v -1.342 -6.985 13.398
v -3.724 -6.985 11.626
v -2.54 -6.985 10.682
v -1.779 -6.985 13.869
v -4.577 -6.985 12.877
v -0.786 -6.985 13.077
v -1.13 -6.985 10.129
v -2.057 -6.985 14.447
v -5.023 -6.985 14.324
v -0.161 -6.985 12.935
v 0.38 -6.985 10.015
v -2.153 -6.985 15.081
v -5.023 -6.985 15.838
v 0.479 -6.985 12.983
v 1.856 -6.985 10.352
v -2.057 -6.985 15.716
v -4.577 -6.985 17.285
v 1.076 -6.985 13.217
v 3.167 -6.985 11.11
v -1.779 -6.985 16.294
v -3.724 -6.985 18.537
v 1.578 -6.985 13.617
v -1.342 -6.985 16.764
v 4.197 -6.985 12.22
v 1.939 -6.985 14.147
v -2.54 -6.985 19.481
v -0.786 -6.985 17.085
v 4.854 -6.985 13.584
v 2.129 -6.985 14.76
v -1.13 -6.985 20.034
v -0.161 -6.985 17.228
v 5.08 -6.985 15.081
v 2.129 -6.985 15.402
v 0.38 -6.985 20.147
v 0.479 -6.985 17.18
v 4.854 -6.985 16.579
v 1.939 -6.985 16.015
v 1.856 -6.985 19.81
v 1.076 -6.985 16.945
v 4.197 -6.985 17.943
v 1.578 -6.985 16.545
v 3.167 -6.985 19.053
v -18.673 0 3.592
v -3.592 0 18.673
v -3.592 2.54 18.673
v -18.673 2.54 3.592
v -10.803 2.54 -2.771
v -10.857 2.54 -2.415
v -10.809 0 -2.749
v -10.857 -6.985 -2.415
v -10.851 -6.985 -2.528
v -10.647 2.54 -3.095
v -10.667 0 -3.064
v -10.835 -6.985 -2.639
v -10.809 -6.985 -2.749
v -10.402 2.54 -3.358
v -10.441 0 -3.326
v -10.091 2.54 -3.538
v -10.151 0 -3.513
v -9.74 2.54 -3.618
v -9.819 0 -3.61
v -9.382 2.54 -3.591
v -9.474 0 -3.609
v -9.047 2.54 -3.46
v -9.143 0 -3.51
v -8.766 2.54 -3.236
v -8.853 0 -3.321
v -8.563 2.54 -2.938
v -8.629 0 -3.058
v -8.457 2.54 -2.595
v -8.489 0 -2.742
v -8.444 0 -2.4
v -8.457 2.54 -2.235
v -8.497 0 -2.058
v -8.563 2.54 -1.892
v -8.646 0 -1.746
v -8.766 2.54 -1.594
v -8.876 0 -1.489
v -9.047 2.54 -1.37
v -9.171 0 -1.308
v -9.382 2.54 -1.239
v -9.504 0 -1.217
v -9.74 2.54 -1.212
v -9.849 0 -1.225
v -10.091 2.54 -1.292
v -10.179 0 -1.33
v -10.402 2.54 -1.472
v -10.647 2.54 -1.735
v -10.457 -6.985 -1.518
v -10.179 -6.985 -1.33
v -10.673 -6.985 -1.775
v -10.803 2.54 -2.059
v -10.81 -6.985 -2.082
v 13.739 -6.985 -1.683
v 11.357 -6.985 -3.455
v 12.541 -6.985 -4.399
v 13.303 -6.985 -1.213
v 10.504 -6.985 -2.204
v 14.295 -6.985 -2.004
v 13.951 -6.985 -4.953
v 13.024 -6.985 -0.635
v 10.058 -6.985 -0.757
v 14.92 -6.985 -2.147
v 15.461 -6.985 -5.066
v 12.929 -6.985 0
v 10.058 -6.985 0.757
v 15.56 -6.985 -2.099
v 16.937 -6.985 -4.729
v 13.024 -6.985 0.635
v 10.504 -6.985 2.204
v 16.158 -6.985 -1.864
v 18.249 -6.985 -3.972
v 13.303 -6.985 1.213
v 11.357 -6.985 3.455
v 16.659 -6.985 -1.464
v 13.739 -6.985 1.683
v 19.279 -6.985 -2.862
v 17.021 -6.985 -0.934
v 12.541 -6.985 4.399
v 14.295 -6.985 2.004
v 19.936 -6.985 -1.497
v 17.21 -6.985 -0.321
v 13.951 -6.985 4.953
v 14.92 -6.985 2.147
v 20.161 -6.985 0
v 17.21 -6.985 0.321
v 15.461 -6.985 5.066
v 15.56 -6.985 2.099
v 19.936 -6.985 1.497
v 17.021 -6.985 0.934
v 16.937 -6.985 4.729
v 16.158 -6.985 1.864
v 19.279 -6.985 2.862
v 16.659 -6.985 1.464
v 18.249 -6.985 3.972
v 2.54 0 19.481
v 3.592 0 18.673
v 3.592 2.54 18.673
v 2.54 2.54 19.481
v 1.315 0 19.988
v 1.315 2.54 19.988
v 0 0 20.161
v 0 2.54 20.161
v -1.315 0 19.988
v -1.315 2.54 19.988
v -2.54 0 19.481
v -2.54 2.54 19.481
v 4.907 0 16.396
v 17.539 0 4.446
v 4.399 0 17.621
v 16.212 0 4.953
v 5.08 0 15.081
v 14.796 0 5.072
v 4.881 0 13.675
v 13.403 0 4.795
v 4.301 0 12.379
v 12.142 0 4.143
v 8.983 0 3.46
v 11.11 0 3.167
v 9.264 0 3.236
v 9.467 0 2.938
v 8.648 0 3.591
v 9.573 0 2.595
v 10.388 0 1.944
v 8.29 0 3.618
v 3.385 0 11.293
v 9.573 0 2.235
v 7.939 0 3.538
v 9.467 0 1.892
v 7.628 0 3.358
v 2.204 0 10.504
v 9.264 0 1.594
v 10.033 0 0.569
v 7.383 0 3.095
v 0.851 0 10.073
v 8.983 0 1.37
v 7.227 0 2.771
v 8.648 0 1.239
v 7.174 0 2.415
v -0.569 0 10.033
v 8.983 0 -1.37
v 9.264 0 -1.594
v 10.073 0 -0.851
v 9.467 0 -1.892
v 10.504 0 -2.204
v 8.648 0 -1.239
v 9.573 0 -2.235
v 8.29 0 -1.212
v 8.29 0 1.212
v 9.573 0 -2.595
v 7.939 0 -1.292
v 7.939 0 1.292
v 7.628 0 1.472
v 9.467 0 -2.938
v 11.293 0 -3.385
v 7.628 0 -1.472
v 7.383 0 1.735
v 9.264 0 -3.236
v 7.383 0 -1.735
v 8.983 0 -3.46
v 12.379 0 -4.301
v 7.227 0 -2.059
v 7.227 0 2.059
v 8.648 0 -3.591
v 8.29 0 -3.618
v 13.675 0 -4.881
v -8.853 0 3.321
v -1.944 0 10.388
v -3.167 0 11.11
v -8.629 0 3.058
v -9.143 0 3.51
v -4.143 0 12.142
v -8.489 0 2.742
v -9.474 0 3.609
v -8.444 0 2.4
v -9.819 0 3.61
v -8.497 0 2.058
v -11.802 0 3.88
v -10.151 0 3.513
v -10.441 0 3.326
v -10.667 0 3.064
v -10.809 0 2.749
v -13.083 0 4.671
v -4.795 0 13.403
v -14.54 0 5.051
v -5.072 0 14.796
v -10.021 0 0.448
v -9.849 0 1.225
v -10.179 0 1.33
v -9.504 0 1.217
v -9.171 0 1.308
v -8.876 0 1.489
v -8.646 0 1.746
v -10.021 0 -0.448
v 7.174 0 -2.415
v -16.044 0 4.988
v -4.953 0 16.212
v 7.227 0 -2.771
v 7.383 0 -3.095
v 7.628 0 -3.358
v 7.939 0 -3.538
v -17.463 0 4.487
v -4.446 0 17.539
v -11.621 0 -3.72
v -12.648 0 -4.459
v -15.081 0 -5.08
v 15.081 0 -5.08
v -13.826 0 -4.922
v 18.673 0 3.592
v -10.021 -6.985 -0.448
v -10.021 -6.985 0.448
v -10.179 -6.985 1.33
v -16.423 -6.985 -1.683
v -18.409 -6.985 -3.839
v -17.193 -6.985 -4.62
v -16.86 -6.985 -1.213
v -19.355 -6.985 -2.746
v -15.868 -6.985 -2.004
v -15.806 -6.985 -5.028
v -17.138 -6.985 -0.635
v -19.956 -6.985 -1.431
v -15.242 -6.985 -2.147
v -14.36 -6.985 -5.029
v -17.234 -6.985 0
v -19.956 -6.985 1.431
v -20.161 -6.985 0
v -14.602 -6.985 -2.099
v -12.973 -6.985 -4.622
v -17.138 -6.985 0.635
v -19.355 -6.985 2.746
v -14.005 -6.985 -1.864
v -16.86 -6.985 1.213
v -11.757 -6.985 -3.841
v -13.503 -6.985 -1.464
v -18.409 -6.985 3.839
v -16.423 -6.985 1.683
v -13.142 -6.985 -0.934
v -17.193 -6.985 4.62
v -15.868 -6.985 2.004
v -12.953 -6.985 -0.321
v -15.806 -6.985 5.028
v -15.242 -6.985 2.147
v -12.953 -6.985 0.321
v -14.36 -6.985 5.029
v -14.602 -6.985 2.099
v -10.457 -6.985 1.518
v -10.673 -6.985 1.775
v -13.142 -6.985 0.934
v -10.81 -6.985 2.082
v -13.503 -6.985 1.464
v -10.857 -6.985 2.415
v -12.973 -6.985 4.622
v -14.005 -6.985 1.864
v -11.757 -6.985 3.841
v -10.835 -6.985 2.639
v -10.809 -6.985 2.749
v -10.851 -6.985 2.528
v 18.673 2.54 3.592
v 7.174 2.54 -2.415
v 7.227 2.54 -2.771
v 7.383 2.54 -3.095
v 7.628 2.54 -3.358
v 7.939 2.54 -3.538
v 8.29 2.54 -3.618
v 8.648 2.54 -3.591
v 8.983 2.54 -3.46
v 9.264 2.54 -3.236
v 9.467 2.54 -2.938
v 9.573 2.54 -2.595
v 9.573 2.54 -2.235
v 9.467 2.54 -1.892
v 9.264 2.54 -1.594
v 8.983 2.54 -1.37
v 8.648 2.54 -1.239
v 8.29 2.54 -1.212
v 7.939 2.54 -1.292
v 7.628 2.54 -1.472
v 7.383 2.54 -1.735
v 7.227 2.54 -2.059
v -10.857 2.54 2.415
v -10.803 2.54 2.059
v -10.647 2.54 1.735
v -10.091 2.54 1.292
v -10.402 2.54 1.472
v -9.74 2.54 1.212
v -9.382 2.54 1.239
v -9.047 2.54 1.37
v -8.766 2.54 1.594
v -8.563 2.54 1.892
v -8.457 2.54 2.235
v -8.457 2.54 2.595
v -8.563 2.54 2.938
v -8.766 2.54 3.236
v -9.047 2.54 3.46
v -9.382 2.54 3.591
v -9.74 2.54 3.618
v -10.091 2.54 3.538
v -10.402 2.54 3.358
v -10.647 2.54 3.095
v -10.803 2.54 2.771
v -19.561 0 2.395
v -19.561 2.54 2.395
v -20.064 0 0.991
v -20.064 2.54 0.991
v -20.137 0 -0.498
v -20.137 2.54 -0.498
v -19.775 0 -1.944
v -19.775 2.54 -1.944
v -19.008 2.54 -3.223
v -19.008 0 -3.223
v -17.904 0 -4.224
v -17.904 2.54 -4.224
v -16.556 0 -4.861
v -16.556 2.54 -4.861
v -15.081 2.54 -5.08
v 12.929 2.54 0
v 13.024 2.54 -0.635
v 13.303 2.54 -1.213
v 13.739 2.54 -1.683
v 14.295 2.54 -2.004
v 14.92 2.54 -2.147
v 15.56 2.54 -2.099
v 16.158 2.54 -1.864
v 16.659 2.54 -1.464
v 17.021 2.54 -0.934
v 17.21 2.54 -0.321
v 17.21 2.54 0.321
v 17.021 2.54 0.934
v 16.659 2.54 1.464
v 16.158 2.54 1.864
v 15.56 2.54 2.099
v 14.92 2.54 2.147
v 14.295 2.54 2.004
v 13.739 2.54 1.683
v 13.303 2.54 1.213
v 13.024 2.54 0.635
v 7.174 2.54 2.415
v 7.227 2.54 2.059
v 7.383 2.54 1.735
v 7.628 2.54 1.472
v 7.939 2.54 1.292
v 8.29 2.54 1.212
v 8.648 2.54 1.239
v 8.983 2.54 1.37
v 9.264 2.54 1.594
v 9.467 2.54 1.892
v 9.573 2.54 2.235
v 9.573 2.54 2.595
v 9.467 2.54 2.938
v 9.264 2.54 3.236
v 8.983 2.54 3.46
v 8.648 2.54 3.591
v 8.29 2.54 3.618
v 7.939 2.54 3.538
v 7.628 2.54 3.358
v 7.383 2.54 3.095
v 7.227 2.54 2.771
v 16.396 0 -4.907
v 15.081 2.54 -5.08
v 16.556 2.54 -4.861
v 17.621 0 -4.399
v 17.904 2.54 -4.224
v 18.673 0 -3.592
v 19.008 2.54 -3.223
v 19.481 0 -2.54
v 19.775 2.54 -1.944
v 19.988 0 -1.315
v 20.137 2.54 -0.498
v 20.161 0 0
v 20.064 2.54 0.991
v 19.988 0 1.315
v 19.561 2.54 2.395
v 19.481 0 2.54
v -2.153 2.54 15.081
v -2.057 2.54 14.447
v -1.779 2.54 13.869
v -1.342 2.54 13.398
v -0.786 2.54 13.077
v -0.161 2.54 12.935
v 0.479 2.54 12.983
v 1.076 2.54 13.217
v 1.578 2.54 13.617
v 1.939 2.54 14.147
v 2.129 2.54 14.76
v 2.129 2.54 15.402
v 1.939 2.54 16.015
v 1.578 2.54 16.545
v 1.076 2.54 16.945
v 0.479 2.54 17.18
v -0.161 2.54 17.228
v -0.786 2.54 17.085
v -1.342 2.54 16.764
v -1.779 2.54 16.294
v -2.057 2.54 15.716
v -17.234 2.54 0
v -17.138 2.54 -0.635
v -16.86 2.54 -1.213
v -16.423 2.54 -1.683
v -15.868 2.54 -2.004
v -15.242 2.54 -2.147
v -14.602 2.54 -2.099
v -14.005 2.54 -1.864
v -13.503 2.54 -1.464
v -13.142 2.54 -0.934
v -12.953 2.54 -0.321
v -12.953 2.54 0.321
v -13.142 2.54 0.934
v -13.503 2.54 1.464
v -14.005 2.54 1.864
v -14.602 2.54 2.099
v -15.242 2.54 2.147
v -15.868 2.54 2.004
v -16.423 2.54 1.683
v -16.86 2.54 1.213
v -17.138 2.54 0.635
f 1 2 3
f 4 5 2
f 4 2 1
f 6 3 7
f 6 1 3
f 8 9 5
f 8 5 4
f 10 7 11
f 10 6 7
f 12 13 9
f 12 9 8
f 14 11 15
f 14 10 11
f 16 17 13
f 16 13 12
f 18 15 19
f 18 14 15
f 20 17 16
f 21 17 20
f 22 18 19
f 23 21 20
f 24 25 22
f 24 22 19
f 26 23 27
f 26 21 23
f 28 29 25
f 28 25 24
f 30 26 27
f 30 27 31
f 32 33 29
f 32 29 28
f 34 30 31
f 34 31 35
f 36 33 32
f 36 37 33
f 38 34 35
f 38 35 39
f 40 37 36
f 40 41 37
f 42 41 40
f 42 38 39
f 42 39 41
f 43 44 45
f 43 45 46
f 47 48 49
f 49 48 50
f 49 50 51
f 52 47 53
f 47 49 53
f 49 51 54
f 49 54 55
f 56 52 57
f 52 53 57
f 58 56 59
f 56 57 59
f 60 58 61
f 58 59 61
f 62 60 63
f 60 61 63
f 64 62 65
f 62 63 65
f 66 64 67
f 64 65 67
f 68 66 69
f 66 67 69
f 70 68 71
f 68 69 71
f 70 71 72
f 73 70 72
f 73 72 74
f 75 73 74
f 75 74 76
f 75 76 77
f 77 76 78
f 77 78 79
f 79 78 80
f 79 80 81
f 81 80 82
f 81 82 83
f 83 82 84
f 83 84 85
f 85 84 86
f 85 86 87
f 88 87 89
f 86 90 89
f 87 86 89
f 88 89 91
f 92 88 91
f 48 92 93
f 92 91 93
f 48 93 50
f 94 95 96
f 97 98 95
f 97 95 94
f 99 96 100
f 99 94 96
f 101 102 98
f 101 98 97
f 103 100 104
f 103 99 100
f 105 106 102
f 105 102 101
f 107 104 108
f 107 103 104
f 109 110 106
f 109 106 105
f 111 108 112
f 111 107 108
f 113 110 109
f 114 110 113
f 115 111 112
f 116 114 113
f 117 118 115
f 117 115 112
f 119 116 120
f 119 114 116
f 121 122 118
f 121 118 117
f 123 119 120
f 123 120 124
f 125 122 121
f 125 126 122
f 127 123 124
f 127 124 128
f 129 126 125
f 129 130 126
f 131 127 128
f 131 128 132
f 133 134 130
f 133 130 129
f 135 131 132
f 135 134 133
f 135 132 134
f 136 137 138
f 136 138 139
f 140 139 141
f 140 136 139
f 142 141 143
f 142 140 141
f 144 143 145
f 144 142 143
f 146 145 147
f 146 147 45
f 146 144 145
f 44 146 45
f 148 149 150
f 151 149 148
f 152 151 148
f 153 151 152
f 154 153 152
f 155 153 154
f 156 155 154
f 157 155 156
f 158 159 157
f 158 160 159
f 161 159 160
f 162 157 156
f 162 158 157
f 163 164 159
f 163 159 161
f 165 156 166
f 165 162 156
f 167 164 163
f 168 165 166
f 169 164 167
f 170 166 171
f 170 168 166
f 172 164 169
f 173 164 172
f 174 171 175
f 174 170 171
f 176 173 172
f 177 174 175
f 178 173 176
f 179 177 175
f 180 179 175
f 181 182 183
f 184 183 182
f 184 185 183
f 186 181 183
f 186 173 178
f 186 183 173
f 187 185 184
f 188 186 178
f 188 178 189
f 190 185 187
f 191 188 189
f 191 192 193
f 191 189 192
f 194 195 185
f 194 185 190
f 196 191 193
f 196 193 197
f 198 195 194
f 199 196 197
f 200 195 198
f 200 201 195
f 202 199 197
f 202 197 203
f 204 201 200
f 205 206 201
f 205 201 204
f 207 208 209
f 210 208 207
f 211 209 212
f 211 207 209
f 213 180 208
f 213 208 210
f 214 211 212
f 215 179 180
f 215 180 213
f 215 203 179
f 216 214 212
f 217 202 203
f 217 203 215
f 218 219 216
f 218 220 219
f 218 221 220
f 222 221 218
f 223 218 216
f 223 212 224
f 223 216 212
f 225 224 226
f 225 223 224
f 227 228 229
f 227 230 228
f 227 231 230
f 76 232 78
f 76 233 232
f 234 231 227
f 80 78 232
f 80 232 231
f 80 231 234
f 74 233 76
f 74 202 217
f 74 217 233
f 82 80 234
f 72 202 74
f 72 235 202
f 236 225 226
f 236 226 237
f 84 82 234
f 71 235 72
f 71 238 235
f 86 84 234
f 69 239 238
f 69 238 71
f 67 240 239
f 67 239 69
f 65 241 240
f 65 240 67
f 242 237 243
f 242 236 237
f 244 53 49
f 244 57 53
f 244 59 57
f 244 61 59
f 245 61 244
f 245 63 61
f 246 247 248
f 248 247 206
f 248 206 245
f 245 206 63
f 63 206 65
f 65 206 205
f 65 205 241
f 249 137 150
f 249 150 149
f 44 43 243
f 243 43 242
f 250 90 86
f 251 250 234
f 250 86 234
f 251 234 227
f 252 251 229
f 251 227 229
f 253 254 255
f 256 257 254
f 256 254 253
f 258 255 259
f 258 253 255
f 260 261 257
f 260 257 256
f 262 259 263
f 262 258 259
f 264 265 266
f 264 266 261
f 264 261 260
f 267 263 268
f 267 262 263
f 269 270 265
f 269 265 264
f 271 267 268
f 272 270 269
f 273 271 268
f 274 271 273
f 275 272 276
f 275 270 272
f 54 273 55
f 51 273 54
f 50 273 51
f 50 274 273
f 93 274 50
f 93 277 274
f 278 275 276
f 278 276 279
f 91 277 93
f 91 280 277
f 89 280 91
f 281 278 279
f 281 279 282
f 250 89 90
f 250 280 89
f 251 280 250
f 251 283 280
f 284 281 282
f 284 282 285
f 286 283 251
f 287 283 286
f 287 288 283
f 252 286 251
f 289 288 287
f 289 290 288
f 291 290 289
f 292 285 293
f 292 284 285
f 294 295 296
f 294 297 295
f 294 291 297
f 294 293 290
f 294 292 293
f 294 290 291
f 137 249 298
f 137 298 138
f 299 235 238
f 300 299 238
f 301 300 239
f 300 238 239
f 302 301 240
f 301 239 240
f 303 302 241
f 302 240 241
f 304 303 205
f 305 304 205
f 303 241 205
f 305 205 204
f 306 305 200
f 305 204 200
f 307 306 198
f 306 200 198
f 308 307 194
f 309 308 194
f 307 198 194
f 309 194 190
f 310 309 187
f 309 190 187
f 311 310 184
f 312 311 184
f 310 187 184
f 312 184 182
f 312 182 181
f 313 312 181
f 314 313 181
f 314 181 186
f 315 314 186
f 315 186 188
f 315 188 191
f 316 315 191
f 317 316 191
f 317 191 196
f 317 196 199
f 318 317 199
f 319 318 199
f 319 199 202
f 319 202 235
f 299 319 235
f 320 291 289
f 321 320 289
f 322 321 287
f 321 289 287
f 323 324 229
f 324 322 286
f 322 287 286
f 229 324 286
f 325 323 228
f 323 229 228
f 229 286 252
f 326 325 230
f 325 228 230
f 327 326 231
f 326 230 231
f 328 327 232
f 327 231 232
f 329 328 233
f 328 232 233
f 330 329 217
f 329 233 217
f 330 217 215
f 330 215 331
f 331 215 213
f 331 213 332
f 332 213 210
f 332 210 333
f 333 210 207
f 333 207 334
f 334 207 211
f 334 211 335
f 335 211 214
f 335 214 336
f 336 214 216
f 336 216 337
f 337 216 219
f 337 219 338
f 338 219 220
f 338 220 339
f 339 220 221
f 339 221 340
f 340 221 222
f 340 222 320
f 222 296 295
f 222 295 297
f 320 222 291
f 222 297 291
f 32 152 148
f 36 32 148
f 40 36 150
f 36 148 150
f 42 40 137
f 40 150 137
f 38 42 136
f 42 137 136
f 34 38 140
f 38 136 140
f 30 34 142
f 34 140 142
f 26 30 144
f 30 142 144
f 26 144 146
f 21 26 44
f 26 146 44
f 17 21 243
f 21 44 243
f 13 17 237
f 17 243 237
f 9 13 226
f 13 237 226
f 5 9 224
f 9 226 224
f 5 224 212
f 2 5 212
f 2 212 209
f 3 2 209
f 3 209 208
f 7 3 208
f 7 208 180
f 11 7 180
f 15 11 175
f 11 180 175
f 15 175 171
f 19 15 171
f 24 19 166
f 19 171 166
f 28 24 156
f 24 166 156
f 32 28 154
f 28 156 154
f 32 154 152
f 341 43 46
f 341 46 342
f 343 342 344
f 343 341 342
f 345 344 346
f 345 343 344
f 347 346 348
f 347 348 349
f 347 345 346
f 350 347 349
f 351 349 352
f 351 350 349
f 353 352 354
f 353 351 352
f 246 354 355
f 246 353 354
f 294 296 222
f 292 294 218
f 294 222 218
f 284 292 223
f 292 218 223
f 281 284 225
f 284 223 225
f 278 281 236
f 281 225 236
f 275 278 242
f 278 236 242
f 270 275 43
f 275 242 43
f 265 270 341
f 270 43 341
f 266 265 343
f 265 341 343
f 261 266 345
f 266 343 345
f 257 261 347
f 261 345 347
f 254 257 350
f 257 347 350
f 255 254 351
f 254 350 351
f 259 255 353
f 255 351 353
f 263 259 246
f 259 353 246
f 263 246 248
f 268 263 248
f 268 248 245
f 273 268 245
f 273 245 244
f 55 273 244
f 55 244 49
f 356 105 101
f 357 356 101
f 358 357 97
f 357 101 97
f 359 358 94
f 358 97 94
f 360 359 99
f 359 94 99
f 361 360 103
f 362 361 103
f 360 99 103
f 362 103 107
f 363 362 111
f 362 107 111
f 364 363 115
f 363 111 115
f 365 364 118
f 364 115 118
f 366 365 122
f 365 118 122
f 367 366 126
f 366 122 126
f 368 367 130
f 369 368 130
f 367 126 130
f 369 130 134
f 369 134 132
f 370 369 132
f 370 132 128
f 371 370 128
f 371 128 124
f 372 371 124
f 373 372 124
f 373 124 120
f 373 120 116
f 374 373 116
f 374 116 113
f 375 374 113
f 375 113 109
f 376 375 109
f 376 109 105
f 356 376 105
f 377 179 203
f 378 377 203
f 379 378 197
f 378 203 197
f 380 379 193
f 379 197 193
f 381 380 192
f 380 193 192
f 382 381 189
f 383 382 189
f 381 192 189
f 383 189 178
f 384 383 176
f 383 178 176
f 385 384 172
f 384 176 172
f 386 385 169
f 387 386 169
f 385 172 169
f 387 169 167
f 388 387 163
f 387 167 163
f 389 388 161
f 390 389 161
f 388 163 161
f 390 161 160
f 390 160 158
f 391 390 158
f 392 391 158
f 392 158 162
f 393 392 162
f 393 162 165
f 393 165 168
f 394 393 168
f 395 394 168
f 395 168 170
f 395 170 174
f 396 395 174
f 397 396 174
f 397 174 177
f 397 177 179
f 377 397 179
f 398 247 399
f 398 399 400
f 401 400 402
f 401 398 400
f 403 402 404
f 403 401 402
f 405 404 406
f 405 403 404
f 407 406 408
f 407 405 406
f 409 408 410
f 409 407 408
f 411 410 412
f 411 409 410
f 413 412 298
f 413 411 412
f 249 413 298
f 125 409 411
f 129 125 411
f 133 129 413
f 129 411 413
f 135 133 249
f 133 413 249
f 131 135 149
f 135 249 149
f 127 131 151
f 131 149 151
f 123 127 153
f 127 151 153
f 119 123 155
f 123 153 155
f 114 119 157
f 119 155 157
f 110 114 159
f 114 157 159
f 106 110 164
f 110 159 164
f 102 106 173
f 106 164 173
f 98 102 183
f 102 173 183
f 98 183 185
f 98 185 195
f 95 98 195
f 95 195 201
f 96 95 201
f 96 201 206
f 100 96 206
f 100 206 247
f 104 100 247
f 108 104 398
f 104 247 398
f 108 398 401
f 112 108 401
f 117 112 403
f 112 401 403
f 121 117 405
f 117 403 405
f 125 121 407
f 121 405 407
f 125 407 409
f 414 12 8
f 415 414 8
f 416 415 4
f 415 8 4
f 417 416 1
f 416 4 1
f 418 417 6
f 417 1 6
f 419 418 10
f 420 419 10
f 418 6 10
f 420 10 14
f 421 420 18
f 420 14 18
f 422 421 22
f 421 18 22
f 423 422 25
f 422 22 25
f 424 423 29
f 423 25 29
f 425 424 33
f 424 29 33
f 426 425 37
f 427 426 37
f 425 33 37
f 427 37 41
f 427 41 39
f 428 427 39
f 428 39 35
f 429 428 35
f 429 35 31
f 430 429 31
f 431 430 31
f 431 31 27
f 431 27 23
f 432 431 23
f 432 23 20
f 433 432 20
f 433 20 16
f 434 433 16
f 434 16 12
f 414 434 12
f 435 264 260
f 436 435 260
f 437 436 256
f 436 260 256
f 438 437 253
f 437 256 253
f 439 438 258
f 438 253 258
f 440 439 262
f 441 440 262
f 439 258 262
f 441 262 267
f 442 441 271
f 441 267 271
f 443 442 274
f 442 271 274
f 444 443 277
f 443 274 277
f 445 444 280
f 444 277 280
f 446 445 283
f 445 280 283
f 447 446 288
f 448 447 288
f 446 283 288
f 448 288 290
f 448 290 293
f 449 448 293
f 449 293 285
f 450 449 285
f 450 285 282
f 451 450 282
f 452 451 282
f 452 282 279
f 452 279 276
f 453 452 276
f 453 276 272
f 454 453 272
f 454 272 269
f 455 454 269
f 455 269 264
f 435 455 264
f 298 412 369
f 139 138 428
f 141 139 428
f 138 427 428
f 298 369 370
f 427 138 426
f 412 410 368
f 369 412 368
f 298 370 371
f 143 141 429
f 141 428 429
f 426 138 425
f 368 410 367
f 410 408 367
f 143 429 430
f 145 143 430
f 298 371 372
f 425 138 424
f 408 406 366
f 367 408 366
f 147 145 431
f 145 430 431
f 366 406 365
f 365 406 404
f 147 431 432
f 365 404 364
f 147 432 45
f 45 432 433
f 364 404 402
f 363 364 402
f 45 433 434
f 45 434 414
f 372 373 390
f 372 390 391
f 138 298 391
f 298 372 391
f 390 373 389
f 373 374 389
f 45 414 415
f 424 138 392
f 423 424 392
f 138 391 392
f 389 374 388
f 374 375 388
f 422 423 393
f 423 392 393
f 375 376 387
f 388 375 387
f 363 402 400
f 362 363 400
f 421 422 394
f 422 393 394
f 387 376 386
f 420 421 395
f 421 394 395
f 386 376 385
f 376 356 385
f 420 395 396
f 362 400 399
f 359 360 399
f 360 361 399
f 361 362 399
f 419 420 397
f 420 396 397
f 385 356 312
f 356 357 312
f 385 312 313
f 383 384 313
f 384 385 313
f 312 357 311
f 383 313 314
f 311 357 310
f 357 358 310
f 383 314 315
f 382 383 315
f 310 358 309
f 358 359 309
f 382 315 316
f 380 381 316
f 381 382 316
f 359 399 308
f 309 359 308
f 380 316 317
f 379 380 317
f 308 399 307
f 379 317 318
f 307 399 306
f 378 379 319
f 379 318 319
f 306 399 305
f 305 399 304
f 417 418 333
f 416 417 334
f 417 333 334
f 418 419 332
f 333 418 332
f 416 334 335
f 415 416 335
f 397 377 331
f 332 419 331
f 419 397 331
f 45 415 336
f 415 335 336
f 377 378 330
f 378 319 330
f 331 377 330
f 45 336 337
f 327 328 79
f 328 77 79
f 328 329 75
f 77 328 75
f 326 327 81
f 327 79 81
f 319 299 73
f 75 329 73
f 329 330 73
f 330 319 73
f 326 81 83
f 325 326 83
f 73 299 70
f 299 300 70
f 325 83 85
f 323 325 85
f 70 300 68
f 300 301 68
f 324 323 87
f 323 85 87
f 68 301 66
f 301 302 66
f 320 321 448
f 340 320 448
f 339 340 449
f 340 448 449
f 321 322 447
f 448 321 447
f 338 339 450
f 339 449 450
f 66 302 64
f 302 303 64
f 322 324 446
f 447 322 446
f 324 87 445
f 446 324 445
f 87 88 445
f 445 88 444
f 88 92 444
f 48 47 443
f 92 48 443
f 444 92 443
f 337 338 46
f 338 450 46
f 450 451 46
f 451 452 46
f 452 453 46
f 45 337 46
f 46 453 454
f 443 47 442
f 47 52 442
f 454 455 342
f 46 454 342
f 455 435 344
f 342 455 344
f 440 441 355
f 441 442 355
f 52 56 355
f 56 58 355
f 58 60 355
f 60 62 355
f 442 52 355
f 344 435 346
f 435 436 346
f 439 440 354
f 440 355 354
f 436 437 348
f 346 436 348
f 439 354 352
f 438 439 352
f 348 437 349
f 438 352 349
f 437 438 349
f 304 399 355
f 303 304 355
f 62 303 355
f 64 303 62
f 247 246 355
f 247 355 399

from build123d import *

# Parameters (mm, degrees)
BOSS_EXTRUDE1_DEPTH       = 2.54
SKETCH2_R                 = 5.08
BOSS_EXTRUDE2_DEPTH       = 6.985
F_6_CLEARANCE_HOLE1_D     = 4.3053
TAP_DRILL_FOR_4_40_TAP1_D = 2.413


with BuildPart() as part:
    # Sketch1 → Boss-Extrude1 (new body)
    with BuildSketch(Plane(origin=(0, 0, 0), x_dir=(1, 0, 0), z_dir=(0, 1, 0))):
        with BuildLine():
            Line((-15.08125, 5.08), (15.08125, 5.08))
            ThreePointArc((15.08125, 5.08), (19.774558025, 1.944031836), (18.673352448, -3.592102448))
            Line((18.673352448, -3.592102448), (3.592102448, -18.673352448))
            ThreePointArc((3.592102448, -18.673352448), (0, -20.16125), (-3.592102448, -18.673352448))
            Line((-3.592102448, -18.673352448), (-18.673352448, -3.592102448))
            ThreePointArc((-18.673352448, -3.592102448), (-19.774558025, 1.944031836), (-15.08125, 5.08))
        make_face()
    extrude(amount=BOSS_EXTRUDE1_DEPTH)

    # Sketch2 → Boss-Extrude2 (add)
    with BuildSketch(Plane.XZ):
        with Locations((-15.08125, 0)):
            Circle(SKETCH2_R)
        with Locations((0, 15.08125)):
            Circle(SKETCH2_R)
        with Locations((15.08125, 0)):
            Circle(SKETCH2_R)
    extrude(amount=BOSS_EXTRUDE2_DEPTH)

    # #6 Clearance Hole1 (through all)
    with Locations(Plane(origin=(0, 2.54, 0), x_dir=(1, 0, 0), z_dir=(0, 1, 0))):
        with Locations((-15.08125, 0), (0, -15.08125), (15.08125, 0)):
            Hole(F_6_CLEARANCE_HOLE1_D / 2)

    # Tap Drill for #4-40 Tap1 (through all)
    with Locations(Plane(origin=(0, 2.54, 0), x_dir=(1, 0, 0), z_dir=(0, 1, 0))):
        with Locations((8.380000004, -2.414999996), (8.380000004, 2.414999996), (-9.650000004, -2.414999996), (-9.650000004, 2.414999996)):
            Hole(TAP_DRILL_FOR_4_40_TAP1_D / 2)


solid = part.part
